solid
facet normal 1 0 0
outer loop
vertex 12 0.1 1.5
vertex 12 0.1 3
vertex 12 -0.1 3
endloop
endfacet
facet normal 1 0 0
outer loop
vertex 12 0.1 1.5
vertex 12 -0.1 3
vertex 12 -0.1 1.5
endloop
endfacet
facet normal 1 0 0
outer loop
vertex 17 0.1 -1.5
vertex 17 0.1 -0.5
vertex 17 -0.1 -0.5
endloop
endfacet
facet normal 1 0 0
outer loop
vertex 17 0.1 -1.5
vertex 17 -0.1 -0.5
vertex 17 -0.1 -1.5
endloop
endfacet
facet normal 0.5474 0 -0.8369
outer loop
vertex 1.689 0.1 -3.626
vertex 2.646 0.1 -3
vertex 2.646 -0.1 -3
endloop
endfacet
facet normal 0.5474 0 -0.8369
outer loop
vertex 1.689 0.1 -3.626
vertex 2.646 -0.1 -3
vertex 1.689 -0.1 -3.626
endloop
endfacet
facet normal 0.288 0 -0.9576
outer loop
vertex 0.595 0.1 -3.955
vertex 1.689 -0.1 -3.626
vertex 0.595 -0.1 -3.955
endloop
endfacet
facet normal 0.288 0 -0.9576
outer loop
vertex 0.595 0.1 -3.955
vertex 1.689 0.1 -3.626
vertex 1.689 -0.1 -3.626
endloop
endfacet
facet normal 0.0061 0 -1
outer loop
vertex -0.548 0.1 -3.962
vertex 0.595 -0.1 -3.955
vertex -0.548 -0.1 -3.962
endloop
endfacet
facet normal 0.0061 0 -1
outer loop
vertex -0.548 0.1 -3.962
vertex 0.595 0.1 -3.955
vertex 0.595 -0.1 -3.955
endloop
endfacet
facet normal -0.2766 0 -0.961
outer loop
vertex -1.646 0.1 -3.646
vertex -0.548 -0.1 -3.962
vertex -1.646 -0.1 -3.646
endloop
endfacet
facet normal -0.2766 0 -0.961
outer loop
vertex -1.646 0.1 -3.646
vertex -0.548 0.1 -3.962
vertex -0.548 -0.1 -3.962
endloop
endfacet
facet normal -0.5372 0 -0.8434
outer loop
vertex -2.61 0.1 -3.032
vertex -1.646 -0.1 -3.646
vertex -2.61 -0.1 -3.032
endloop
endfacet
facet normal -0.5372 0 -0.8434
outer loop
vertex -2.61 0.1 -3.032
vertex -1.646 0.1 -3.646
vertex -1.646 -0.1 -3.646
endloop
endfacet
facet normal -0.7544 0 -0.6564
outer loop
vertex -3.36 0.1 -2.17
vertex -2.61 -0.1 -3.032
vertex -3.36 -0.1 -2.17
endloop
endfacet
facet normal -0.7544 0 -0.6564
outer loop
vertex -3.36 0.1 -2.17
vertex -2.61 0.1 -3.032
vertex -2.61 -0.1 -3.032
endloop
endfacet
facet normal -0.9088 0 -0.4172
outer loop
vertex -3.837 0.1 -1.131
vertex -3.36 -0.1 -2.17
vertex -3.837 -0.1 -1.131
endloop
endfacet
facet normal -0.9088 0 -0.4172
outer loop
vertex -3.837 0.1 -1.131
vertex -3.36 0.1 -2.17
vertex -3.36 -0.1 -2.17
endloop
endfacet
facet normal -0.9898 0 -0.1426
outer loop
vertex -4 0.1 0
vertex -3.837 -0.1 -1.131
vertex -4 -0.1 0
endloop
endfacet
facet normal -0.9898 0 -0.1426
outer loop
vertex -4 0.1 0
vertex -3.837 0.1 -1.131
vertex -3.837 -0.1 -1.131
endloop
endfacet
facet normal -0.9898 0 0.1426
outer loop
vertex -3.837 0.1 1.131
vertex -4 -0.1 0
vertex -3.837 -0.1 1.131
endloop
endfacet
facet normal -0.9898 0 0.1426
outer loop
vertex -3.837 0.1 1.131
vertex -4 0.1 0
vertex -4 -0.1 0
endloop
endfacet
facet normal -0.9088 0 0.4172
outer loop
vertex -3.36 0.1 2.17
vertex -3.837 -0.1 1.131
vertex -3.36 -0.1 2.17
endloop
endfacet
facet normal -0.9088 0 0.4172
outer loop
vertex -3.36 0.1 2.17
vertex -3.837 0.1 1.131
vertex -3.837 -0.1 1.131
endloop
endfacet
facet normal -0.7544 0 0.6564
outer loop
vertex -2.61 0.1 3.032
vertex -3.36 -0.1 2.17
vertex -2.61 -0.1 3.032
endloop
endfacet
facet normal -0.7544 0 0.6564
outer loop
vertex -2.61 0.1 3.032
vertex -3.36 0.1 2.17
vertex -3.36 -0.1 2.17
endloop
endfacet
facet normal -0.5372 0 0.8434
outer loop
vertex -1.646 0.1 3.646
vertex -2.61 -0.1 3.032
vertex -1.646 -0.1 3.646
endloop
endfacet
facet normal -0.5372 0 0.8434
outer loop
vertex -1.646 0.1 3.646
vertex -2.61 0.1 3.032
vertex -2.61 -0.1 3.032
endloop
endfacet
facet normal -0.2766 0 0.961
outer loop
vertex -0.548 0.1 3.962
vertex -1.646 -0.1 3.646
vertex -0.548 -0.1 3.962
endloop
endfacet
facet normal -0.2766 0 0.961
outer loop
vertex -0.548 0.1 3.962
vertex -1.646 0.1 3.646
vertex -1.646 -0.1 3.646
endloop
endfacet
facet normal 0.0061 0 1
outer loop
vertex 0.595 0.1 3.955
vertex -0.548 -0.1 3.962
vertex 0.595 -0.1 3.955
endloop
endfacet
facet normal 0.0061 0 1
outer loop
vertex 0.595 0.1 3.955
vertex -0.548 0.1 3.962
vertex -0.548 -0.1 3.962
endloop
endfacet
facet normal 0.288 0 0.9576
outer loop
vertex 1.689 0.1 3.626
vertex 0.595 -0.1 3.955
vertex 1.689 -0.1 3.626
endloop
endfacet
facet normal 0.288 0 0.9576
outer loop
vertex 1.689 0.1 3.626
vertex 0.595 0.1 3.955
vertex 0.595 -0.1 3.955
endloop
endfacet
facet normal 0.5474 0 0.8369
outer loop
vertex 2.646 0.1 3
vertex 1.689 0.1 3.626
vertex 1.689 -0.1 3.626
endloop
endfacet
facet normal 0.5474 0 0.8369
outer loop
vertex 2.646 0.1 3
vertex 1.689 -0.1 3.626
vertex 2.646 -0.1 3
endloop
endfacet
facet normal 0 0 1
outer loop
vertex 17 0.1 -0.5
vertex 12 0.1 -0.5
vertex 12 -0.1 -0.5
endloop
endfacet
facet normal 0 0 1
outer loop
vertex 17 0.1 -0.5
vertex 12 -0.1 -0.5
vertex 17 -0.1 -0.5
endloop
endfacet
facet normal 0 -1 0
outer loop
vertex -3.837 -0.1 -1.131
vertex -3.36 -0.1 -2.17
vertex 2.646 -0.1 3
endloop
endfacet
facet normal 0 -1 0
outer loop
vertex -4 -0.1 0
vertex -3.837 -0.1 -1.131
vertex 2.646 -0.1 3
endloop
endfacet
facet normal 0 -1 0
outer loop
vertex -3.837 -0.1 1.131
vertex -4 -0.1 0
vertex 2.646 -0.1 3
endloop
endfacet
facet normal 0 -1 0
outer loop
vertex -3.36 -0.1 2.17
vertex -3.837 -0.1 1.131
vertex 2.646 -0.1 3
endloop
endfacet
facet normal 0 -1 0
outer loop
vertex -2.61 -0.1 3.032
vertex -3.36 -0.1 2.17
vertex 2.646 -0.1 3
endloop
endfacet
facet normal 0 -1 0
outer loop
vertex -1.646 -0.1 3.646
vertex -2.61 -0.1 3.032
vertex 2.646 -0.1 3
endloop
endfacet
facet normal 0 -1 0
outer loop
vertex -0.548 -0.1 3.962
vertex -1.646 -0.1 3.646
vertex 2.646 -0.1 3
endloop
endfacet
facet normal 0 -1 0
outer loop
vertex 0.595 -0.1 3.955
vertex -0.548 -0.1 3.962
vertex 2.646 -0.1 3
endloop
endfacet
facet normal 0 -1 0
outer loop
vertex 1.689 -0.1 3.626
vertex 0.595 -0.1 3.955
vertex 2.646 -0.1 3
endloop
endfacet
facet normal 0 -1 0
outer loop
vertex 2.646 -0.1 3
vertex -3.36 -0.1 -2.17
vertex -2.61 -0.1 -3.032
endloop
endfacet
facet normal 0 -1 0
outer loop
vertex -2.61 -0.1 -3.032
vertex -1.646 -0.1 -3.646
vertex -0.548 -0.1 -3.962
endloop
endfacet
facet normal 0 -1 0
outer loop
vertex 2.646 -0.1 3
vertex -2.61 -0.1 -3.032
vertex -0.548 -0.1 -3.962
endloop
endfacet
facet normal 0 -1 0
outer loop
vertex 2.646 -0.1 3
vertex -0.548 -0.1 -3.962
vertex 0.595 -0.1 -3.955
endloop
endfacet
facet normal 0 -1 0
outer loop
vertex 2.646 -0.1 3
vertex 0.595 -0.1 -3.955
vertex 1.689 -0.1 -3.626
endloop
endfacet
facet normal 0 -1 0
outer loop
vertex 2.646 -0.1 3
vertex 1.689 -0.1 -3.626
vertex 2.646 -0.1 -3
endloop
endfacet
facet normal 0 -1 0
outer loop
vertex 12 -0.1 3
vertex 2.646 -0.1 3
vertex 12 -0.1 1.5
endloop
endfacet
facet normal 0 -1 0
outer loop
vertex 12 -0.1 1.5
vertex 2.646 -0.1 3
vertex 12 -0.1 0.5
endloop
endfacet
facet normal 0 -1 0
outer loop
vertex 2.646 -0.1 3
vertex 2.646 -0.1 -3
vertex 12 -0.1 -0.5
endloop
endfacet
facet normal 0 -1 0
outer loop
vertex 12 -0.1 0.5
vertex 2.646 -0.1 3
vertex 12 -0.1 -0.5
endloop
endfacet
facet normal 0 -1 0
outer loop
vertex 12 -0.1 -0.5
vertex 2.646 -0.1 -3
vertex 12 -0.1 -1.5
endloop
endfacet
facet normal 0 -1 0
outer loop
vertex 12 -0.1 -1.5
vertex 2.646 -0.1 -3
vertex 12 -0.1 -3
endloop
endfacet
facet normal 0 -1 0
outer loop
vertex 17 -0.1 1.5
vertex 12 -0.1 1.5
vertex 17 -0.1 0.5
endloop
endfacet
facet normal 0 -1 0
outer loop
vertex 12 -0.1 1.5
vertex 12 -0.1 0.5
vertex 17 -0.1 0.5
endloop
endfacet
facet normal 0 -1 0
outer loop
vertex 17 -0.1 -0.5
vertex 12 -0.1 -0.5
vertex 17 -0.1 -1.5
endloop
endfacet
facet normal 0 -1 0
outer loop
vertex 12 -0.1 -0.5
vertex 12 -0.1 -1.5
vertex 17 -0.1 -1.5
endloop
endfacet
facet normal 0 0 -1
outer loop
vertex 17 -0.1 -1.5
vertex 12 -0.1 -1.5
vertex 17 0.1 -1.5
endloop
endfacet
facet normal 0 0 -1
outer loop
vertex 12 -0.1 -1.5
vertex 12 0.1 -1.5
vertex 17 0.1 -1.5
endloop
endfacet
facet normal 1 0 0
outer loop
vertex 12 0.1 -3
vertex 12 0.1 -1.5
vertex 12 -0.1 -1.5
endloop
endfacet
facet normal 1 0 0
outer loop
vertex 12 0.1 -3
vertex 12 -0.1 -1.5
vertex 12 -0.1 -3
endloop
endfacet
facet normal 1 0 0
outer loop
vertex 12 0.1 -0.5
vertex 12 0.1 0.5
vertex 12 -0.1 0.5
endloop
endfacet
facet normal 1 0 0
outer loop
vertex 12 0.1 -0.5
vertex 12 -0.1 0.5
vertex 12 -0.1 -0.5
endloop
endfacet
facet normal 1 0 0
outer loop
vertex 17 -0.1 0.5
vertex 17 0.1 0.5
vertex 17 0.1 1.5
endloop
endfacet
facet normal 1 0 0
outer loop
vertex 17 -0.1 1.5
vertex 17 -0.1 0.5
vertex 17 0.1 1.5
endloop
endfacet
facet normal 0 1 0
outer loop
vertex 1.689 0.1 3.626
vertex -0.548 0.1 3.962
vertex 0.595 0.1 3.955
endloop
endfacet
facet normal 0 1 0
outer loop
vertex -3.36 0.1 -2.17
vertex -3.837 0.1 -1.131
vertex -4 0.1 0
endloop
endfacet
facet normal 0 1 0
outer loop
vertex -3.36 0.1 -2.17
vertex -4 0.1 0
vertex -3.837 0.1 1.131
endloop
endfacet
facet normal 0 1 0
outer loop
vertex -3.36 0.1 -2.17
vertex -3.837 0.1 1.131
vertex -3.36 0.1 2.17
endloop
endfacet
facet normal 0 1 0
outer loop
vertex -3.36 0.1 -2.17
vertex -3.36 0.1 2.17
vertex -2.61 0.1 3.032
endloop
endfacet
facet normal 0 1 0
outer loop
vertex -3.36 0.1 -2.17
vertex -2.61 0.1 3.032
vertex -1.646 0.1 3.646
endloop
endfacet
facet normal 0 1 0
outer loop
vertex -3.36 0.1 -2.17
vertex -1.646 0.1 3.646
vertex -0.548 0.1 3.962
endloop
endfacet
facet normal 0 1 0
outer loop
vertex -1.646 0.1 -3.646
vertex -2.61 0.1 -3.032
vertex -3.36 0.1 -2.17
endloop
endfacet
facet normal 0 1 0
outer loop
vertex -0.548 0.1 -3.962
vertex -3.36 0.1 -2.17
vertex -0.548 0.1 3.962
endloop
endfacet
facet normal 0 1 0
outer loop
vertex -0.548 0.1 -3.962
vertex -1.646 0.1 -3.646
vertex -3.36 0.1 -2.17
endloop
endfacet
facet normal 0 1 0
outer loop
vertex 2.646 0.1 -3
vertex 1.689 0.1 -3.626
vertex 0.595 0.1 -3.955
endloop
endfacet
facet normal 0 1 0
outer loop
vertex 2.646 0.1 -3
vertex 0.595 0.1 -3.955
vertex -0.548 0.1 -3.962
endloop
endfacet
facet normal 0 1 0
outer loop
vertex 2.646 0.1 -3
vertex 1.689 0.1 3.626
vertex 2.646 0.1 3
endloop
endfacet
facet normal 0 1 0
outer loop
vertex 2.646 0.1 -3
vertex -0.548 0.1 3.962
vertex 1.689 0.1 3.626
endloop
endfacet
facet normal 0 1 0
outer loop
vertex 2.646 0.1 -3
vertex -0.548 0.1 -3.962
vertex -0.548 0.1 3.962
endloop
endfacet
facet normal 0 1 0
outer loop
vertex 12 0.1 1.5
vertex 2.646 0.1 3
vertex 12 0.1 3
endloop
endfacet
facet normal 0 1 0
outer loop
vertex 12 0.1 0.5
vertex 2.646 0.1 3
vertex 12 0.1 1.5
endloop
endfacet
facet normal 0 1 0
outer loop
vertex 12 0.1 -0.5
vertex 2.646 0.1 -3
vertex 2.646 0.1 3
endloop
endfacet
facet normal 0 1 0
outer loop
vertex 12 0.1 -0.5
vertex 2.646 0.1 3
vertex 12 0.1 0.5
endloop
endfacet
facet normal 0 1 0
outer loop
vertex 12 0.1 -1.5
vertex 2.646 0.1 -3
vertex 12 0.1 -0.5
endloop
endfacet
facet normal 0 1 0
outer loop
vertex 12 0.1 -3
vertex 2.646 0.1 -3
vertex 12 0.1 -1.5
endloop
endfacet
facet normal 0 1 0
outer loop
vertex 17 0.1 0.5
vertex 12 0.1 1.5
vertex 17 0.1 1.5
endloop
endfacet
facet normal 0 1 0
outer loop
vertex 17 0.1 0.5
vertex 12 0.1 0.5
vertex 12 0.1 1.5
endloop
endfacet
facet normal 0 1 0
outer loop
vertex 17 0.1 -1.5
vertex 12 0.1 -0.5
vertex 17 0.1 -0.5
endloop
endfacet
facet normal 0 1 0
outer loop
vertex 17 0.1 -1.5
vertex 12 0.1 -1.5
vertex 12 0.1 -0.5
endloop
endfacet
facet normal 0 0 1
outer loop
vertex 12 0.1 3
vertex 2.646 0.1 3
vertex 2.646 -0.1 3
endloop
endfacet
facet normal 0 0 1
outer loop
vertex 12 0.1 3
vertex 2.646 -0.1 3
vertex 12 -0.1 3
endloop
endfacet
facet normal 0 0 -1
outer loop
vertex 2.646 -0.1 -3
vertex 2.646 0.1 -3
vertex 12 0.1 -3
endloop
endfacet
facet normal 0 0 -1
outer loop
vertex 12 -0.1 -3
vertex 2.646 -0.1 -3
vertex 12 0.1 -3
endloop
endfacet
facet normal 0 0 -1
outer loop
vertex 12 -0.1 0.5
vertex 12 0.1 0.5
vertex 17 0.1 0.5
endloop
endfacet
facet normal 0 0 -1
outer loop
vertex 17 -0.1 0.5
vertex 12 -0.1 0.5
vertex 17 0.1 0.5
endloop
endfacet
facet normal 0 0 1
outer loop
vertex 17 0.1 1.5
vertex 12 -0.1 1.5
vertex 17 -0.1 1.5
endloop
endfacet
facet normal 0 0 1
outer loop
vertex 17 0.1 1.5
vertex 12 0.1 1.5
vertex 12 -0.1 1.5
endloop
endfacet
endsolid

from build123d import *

# Parameters (mm, degrees)
SKETCH1_R           = 4
BOSS_EXTRUDE1_DEPTH = 0.1
SKETCH2_W           = 12
SKETCH2_H           = 6
BOSS_EXTRUDE2_DEPTH = 0.1
SKETCH3_W           = 5
SKETCH3_H           = 1
BOSS_EXTRUDE3_DEPTH = 0.1


with BuildPart() as part:
    # Sketch1 → Boss-Extrude1 (new body, symmetric)
    with BuildSketch(Plane(origin=(0, 0, 0), x_dir=(1, 0, 0), z_dir=(0, 1, 0))):
        Circle(SKETCH1_R)
    extrude(amount=BOSS_EXTRUDE1_DEPTH, both=True)

    # Sketch2 → Boss-Extrude2 (add, symmetric)
    with BuildSketch(Plane(origin=(0, 0, 0), x_dir=(1, 0, 0), z_dir=(0, 1, 0))):
        with Locations((6, 0)):
            Rectangle(SKETCH2_W, SKETCH2_H)
    extrude(amount=BOSS_EXTRUDE2_DEPTH, both=True)

    # Sketch3 → Boss-Extrude3 (add, symmetric)
    with BuildSketch(Plane(origin=(0, 0, 0), x_dir=(1, 0, 0), z_dir=(0, 1, 0))):
        with Locations((14.5, 1)):
            Rectangle(SKETCH3_W, SKETCH3_H)
    boss_extrude3 = extrude(amount=BOSS_EXTRUDE3_DEPTH, both=True)

    # Mirror1: Boss-Extrude3 across plane
    add(boss_extrude3.mirror(Plane.XY))


solid = part.part
